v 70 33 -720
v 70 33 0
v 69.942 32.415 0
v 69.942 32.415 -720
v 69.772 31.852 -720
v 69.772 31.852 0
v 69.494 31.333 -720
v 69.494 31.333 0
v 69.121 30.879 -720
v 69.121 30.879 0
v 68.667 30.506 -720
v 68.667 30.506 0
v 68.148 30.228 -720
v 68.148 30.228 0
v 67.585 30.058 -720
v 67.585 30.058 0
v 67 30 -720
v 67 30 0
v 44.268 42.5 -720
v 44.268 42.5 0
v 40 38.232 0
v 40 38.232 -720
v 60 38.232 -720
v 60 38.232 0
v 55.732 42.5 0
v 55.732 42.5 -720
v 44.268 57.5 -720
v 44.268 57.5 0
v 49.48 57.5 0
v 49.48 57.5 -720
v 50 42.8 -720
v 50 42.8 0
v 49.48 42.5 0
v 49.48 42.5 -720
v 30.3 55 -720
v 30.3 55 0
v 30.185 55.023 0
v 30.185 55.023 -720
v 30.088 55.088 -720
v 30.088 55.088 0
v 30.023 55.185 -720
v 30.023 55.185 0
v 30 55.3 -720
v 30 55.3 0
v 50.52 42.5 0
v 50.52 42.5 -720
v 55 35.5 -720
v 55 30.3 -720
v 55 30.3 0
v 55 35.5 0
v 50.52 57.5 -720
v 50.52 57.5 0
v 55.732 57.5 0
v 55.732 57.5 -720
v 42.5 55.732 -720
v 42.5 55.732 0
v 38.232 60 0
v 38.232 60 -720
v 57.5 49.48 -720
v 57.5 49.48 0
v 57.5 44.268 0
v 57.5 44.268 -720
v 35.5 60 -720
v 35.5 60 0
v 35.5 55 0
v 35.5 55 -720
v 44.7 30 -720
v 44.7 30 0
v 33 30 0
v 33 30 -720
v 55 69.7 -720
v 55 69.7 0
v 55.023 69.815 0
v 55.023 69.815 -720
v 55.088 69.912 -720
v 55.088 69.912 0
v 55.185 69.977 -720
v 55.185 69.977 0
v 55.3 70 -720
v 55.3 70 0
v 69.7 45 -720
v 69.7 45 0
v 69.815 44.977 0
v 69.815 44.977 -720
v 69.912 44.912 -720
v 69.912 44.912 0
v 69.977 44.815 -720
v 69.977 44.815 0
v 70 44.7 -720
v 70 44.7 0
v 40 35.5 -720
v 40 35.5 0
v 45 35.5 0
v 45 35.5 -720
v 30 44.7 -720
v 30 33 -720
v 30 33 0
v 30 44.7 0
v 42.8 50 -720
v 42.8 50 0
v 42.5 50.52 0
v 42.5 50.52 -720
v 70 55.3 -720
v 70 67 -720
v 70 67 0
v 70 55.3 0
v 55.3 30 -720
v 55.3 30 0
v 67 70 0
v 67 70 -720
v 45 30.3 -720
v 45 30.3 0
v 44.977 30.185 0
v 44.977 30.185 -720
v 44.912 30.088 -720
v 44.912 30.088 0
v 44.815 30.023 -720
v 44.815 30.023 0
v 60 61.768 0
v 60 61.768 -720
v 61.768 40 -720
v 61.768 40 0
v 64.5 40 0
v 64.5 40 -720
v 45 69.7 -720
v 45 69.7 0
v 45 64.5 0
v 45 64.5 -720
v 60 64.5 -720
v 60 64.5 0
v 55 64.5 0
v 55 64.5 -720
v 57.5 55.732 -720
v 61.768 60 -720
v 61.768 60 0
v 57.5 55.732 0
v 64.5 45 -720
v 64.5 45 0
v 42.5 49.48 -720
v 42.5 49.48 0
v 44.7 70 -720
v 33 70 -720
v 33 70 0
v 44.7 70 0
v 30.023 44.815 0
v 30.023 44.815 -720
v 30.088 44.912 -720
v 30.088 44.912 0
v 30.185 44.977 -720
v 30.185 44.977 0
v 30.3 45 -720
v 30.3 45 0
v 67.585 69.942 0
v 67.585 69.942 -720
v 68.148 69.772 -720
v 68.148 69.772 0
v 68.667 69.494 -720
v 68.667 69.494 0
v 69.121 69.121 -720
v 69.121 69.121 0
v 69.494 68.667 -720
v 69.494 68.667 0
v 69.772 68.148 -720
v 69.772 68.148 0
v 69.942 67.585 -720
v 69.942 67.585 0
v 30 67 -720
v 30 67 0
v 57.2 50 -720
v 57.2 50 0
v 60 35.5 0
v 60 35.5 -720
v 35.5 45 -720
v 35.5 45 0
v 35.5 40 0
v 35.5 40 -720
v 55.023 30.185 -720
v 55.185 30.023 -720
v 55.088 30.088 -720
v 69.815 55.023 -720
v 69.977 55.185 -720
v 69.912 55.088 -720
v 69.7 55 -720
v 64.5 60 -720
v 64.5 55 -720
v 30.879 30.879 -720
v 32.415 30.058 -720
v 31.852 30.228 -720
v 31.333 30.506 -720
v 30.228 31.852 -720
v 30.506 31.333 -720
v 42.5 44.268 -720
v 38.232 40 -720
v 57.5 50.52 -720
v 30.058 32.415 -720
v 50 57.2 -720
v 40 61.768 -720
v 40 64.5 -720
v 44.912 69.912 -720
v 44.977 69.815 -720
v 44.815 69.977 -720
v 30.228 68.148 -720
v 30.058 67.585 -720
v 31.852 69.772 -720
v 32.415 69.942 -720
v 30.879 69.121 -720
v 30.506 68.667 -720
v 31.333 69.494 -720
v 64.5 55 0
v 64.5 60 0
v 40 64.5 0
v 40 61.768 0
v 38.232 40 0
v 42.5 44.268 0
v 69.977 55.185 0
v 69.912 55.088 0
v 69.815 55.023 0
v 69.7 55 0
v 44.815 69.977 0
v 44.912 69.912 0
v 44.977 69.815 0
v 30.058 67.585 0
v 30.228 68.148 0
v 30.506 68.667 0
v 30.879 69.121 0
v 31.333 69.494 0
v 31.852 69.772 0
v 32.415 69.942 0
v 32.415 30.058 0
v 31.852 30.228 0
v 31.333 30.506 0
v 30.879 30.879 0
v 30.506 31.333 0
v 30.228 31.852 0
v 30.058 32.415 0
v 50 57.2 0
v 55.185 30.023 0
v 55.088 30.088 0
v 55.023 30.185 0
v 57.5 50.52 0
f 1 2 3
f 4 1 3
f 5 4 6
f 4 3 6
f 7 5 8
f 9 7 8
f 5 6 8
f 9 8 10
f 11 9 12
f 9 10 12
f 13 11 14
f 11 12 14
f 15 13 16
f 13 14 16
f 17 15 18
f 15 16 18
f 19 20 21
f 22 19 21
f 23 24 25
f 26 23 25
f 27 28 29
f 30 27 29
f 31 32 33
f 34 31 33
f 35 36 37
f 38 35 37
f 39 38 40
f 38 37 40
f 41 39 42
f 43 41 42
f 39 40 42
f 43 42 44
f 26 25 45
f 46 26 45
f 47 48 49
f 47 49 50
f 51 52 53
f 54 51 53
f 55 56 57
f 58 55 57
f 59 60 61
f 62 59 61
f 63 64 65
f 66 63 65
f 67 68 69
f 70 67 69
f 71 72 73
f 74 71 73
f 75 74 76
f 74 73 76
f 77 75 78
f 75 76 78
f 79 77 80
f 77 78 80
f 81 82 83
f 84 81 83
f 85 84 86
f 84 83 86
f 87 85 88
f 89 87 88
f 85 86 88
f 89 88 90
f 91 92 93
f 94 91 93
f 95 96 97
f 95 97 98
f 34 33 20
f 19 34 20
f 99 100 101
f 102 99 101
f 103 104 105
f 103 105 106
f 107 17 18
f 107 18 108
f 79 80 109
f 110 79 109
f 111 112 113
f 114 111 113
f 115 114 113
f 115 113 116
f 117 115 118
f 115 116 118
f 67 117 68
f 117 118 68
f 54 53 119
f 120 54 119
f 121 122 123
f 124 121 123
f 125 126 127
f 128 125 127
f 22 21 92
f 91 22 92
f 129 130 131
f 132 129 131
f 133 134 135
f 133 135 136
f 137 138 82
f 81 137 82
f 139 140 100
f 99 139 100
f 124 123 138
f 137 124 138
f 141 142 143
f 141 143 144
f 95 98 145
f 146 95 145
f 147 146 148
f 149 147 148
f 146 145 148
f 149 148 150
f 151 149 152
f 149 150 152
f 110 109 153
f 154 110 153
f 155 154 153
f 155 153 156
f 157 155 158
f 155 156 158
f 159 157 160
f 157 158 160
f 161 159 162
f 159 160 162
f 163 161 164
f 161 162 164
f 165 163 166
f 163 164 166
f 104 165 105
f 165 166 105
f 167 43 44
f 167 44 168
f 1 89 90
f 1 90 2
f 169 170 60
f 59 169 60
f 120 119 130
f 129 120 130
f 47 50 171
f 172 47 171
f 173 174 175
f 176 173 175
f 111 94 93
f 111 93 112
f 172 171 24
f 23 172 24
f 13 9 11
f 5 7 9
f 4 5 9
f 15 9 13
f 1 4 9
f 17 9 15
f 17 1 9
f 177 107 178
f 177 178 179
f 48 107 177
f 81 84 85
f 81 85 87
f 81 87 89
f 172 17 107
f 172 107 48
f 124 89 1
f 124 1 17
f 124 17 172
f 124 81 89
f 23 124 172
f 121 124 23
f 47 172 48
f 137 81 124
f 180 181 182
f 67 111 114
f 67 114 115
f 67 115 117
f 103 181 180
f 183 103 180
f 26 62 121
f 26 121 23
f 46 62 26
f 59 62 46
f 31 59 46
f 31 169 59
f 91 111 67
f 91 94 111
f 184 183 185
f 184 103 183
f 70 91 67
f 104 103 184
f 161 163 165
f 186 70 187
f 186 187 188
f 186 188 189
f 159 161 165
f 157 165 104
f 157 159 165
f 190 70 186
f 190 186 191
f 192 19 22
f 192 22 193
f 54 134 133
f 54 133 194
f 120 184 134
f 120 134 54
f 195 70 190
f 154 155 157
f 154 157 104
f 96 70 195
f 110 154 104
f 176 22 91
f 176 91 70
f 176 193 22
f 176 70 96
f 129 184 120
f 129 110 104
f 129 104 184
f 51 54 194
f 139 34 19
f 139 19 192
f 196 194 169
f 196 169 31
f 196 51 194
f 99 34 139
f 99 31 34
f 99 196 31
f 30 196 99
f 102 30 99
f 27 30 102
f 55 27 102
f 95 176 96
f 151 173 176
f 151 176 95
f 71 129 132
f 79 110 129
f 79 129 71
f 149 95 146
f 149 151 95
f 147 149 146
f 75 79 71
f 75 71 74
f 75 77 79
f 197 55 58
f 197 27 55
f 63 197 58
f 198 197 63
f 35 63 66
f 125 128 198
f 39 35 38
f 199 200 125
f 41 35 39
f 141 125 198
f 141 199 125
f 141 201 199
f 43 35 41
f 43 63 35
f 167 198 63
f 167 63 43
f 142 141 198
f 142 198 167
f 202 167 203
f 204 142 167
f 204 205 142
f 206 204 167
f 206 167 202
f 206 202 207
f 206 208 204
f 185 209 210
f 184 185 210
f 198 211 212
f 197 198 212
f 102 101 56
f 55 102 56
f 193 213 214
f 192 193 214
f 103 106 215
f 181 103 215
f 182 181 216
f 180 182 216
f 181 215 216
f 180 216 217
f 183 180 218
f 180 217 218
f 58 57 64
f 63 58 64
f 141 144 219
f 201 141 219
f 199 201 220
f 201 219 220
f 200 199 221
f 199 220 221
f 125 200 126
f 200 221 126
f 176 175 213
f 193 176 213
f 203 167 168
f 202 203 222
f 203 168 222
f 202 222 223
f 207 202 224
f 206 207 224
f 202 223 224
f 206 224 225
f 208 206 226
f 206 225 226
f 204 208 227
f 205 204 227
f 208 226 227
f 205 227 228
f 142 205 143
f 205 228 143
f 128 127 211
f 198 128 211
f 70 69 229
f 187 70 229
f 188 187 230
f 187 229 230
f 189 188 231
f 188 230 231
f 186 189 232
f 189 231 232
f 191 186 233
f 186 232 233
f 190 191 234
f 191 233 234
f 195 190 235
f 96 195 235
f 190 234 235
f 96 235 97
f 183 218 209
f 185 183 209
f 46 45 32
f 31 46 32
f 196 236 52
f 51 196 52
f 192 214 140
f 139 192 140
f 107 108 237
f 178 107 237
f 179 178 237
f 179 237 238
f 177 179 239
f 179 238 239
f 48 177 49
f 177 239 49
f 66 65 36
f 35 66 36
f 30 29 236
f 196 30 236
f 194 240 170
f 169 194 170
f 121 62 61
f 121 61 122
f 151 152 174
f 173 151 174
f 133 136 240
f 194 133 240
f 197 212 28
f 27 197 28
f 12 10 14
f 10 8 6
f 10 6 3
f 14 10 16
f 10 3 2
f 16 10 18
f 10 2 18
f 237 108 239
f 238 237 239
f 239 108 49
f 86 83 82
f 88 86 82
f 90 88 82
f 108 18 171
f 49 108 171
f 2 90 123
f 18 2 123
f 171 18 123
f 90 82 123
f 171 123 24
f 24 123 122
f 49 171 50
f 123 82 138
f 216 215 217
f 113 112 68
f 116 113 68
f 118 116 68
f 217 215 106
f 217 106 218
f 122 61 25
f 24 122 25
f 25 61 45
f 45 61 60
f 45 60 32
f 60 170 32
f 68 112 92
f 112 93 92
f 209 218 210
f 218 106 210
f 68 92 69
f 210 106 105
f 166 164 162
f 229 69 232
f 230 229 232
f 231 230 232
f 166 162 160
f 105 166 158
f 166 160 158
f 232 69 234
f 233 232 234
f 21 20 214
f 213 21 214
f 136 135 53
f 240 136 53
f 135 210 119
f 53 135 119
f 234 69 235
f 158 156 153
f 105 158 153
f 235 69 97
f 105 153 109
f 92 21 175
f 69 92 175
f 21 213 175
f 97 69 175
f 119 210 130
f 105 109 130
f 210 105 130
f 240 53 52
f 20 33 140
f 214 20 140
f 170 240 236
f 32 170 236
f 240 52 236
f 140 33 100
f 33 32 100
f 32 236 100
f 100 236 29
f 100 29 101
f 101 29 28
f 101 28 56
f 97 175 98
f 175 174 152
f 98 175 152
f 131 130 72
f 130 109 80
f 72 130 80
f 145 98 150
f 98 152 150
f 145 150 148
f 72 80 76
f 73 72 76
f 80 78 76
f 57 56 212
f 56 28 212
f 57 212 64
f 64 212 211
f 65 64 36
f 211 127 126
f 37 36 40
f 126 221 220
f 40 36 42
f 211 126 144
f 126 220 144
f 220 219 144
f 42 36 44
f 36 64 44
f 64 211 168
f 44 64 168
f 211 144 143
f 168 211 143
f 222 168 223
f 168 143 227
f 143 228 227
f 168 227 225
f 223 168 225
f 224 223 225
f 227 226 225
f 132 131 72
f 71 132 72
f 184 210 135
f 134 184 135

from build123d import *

# Parameters (mm, degrees)
EXTRUDE_1_DEPTH = 720


with BuildPart() as part:
    # Model → ﾎﾞｽ - 押し出し1 (new body)
    with BuildSketch(Plane.XY):
        with BuildLine():
            Line((69.700000053, 55.000000195), (64.500000711, 55.000000195))
            Line((64.500000711, 55.000000195), (64.500000711, 60.000002187))
            Line((64.500000711, 60.000002187), (61.76777021, 60.000002187))
            Line((61.76777021, 60.000002187), (57.500000584, 55.732232559))
            Line((57.500000584, 55.732232559), (57.500000584, 50.519614724))
            Line((57.500000584, 50.519614724), (57.199999339, 50.000000177))
            Line((57.199999339, 50.000000177), (57.500000584, 49.48038563))
            Line((57.500000584, 49.48038563), (57.500000584, 44.267767795))
            Line((57.500000584, 44.267767795), (61.76777021, 39.999998167))
            Line((61.76777021, 39.999998167), (64.500000711, 39.999998167))
            Line((64.500000711, 39.999998167), (64.500000711, 45.000000159))
            Line((64.500000711, 45.000000159), (69.700000053, 45.000000159))
            ThreePointArc((69.700000053, 45.000000159), (69.9121326, 44.912131981), (70.000000778, 44.699999434))
            Line((70.000000778, 44.699999434), (70.000000778, 33.000000332))
            ThreePointArc((70.000000778, 33.000000332), (69.121321121, 30.878679988), (67.000000778, 30.000000332))
            Line((67.000000778, 30.000000332), (55.300001675, 30.000000332))
            ThreePointArc((55.300001675, 30.000000332), (55.087869129, 30.08786851), (55.000000951, 30.300001056))
            Line((55.000000951, 30.300001056), (55.000000951, 35.500000399))
            Line((55.000000951, 35.500000399), (60.000002943, 35.500000399))
            Line((60.000002943, 35.500000399), (60.000002943, 38.232230899))
            Line((60.000002943, 38.232230899), (55.732233316, 42.500000527))
            Line((55.732233316, 42.500000527), (50.519615481, 42.500000527))
            Line((50.519615481, 42.500000527), (50.000000936, 42.800001775))
            Line((50.000000936, 42.800001775), (49.480386391, 42.500000527))
            Line((49.480386391, 42.500000527), (44.267768556, 42.500000527))
            Line((44.267768556, 42.500000527), (39.999998929, 38.232230899))
            Line((39.999998929, 38.232230899), (39.999998929, 35.500000399))
            Line((39.999998929, 35.500000399), (45.000000921, 35.500000399))
            Line((45.000000921, 35.500000399), (45.000000921, 30.300001056))
            ThreePointArc((45.000000921, 30.300001056), (44.912132743, 30.08786851), (44.700000197, 30.000000332))
            Line((44.700000197, 30.000000332), (33.000001094, 30.000000332))
            ThreePointArc((33.000001094, 30.000000332), (30.87868075, 30.878679988), (30.000001094, 33.000000332))
            Line((30.000001094, 33.000000332), (30.000001094, 44.699999434))
            ThreePointArc((30.000001094, 44.699999434), (30.087869272, 44.912131981), (30.300001819, 45.000000159))
            Line((30.300001819, 45.000000159), (35.500001161, 45.000000159))
            Line((35.500001161, 45.000000159), (35.500001161, 39.999998167))
            Line((35.500001161, 39.999998167), (38.232231661, 39.999998167))
            Line((38.232231661, 39.999998167), (42.499994889, 44.267761396))
            Line((42.499994889, 44.267761396), (42.499994889, 49.48038563))
            Line((42.499994889, 49.48038563), (42.799996134, 50.000000177))
            Line((42.799996134, 50.000000177), (42.499994889, 50.519614724))
            Line((42.499994889, 50.519614724), (42.499994889, 55.732238958))
            Line((42.499994889, 55.732238958), (38.232231661, 60.000002187))
            Line((38.232231661, 60.000002187), (35.500001161, 60.000002187))
            Line((35.500001161, 60.000002187), (35.500001161, 55.000000195))
            Line((35.500001161, 55.000000195), (30.300001819, 55.000000195))
            ThreePointArc((30.300001819, 55.000000195), (30.087869272, 55.087868373), (30.000001094, 55.30000092))
            Line((30.000001094, 55.30000092), (30.000001094, 67.000000023))
            ThreePointArc((30.000001094, 67.000000023), (30.87868075, 69.121320366), (33.000001094, 70.000000023))
            Line((33.000001094, 70.000000023), (44.700000197, 70.000000023))
            ThreePointArc((44.700000197, 70.000000023), (44.912132743, 69.912131845), (45.000000921, 69.699999298))
            Line((45.000000921, 69.699999298), (45.000000921, 64.499999956))
            Line((45.000000921, 64.499999956), (39.999998929, 64.499999956))
            Line((39.999998929, 64.499999956), (39.999998929, 61.767769455))
            Line((39.999998929, 61.767769455), (44.267768556, 57.499999827))
            Line((44.267768556, 57.499999827), (49.480386391, 57.499999827))
            Line((49.480386391, 57.499999827), (50.000000936, 57.199998579))
            Line((50.000000936, 57.199998579), (50.519615481, 57.499999827))
            Line((50.519615481, 57.499999827), (55.732233316, 57.499999827))
            Line((55.732233316, 57.499999827), (60.000002943, 61.767769455))
            Line((60.000002943, 61.767769455), (60.000002943, 64.499999956))
            Line((60.000002943, 64.499999956), (55.000000951, 64.499999956))
            Line((55.000000951, 64.499999956), (55.000000951, 69.699999298))
            ThreePointArc((55.000000951, 69.699999298), (55.087869129, 69.912131845), (55.300001675, 70.000000023))
            Line((55.300001675, 70.000000023), (67.000000778, 70.000000023))
            ThreePointArc((67.000000778, 70.000000023), (69.121321121, 69.121320366), (70.000000778, 67.000000023))
            Line((70.000000778, 67.000000023), (70.000000778, 55.30000092))
            ThreePointArc((70.000000778, 55.30000092), (69.9121326, 55.087868373), (69.700000053, 55.000000195))
        make_face()
    extrude(amount=-EXTRUDE_1_DEPTH)


solid = part.part
